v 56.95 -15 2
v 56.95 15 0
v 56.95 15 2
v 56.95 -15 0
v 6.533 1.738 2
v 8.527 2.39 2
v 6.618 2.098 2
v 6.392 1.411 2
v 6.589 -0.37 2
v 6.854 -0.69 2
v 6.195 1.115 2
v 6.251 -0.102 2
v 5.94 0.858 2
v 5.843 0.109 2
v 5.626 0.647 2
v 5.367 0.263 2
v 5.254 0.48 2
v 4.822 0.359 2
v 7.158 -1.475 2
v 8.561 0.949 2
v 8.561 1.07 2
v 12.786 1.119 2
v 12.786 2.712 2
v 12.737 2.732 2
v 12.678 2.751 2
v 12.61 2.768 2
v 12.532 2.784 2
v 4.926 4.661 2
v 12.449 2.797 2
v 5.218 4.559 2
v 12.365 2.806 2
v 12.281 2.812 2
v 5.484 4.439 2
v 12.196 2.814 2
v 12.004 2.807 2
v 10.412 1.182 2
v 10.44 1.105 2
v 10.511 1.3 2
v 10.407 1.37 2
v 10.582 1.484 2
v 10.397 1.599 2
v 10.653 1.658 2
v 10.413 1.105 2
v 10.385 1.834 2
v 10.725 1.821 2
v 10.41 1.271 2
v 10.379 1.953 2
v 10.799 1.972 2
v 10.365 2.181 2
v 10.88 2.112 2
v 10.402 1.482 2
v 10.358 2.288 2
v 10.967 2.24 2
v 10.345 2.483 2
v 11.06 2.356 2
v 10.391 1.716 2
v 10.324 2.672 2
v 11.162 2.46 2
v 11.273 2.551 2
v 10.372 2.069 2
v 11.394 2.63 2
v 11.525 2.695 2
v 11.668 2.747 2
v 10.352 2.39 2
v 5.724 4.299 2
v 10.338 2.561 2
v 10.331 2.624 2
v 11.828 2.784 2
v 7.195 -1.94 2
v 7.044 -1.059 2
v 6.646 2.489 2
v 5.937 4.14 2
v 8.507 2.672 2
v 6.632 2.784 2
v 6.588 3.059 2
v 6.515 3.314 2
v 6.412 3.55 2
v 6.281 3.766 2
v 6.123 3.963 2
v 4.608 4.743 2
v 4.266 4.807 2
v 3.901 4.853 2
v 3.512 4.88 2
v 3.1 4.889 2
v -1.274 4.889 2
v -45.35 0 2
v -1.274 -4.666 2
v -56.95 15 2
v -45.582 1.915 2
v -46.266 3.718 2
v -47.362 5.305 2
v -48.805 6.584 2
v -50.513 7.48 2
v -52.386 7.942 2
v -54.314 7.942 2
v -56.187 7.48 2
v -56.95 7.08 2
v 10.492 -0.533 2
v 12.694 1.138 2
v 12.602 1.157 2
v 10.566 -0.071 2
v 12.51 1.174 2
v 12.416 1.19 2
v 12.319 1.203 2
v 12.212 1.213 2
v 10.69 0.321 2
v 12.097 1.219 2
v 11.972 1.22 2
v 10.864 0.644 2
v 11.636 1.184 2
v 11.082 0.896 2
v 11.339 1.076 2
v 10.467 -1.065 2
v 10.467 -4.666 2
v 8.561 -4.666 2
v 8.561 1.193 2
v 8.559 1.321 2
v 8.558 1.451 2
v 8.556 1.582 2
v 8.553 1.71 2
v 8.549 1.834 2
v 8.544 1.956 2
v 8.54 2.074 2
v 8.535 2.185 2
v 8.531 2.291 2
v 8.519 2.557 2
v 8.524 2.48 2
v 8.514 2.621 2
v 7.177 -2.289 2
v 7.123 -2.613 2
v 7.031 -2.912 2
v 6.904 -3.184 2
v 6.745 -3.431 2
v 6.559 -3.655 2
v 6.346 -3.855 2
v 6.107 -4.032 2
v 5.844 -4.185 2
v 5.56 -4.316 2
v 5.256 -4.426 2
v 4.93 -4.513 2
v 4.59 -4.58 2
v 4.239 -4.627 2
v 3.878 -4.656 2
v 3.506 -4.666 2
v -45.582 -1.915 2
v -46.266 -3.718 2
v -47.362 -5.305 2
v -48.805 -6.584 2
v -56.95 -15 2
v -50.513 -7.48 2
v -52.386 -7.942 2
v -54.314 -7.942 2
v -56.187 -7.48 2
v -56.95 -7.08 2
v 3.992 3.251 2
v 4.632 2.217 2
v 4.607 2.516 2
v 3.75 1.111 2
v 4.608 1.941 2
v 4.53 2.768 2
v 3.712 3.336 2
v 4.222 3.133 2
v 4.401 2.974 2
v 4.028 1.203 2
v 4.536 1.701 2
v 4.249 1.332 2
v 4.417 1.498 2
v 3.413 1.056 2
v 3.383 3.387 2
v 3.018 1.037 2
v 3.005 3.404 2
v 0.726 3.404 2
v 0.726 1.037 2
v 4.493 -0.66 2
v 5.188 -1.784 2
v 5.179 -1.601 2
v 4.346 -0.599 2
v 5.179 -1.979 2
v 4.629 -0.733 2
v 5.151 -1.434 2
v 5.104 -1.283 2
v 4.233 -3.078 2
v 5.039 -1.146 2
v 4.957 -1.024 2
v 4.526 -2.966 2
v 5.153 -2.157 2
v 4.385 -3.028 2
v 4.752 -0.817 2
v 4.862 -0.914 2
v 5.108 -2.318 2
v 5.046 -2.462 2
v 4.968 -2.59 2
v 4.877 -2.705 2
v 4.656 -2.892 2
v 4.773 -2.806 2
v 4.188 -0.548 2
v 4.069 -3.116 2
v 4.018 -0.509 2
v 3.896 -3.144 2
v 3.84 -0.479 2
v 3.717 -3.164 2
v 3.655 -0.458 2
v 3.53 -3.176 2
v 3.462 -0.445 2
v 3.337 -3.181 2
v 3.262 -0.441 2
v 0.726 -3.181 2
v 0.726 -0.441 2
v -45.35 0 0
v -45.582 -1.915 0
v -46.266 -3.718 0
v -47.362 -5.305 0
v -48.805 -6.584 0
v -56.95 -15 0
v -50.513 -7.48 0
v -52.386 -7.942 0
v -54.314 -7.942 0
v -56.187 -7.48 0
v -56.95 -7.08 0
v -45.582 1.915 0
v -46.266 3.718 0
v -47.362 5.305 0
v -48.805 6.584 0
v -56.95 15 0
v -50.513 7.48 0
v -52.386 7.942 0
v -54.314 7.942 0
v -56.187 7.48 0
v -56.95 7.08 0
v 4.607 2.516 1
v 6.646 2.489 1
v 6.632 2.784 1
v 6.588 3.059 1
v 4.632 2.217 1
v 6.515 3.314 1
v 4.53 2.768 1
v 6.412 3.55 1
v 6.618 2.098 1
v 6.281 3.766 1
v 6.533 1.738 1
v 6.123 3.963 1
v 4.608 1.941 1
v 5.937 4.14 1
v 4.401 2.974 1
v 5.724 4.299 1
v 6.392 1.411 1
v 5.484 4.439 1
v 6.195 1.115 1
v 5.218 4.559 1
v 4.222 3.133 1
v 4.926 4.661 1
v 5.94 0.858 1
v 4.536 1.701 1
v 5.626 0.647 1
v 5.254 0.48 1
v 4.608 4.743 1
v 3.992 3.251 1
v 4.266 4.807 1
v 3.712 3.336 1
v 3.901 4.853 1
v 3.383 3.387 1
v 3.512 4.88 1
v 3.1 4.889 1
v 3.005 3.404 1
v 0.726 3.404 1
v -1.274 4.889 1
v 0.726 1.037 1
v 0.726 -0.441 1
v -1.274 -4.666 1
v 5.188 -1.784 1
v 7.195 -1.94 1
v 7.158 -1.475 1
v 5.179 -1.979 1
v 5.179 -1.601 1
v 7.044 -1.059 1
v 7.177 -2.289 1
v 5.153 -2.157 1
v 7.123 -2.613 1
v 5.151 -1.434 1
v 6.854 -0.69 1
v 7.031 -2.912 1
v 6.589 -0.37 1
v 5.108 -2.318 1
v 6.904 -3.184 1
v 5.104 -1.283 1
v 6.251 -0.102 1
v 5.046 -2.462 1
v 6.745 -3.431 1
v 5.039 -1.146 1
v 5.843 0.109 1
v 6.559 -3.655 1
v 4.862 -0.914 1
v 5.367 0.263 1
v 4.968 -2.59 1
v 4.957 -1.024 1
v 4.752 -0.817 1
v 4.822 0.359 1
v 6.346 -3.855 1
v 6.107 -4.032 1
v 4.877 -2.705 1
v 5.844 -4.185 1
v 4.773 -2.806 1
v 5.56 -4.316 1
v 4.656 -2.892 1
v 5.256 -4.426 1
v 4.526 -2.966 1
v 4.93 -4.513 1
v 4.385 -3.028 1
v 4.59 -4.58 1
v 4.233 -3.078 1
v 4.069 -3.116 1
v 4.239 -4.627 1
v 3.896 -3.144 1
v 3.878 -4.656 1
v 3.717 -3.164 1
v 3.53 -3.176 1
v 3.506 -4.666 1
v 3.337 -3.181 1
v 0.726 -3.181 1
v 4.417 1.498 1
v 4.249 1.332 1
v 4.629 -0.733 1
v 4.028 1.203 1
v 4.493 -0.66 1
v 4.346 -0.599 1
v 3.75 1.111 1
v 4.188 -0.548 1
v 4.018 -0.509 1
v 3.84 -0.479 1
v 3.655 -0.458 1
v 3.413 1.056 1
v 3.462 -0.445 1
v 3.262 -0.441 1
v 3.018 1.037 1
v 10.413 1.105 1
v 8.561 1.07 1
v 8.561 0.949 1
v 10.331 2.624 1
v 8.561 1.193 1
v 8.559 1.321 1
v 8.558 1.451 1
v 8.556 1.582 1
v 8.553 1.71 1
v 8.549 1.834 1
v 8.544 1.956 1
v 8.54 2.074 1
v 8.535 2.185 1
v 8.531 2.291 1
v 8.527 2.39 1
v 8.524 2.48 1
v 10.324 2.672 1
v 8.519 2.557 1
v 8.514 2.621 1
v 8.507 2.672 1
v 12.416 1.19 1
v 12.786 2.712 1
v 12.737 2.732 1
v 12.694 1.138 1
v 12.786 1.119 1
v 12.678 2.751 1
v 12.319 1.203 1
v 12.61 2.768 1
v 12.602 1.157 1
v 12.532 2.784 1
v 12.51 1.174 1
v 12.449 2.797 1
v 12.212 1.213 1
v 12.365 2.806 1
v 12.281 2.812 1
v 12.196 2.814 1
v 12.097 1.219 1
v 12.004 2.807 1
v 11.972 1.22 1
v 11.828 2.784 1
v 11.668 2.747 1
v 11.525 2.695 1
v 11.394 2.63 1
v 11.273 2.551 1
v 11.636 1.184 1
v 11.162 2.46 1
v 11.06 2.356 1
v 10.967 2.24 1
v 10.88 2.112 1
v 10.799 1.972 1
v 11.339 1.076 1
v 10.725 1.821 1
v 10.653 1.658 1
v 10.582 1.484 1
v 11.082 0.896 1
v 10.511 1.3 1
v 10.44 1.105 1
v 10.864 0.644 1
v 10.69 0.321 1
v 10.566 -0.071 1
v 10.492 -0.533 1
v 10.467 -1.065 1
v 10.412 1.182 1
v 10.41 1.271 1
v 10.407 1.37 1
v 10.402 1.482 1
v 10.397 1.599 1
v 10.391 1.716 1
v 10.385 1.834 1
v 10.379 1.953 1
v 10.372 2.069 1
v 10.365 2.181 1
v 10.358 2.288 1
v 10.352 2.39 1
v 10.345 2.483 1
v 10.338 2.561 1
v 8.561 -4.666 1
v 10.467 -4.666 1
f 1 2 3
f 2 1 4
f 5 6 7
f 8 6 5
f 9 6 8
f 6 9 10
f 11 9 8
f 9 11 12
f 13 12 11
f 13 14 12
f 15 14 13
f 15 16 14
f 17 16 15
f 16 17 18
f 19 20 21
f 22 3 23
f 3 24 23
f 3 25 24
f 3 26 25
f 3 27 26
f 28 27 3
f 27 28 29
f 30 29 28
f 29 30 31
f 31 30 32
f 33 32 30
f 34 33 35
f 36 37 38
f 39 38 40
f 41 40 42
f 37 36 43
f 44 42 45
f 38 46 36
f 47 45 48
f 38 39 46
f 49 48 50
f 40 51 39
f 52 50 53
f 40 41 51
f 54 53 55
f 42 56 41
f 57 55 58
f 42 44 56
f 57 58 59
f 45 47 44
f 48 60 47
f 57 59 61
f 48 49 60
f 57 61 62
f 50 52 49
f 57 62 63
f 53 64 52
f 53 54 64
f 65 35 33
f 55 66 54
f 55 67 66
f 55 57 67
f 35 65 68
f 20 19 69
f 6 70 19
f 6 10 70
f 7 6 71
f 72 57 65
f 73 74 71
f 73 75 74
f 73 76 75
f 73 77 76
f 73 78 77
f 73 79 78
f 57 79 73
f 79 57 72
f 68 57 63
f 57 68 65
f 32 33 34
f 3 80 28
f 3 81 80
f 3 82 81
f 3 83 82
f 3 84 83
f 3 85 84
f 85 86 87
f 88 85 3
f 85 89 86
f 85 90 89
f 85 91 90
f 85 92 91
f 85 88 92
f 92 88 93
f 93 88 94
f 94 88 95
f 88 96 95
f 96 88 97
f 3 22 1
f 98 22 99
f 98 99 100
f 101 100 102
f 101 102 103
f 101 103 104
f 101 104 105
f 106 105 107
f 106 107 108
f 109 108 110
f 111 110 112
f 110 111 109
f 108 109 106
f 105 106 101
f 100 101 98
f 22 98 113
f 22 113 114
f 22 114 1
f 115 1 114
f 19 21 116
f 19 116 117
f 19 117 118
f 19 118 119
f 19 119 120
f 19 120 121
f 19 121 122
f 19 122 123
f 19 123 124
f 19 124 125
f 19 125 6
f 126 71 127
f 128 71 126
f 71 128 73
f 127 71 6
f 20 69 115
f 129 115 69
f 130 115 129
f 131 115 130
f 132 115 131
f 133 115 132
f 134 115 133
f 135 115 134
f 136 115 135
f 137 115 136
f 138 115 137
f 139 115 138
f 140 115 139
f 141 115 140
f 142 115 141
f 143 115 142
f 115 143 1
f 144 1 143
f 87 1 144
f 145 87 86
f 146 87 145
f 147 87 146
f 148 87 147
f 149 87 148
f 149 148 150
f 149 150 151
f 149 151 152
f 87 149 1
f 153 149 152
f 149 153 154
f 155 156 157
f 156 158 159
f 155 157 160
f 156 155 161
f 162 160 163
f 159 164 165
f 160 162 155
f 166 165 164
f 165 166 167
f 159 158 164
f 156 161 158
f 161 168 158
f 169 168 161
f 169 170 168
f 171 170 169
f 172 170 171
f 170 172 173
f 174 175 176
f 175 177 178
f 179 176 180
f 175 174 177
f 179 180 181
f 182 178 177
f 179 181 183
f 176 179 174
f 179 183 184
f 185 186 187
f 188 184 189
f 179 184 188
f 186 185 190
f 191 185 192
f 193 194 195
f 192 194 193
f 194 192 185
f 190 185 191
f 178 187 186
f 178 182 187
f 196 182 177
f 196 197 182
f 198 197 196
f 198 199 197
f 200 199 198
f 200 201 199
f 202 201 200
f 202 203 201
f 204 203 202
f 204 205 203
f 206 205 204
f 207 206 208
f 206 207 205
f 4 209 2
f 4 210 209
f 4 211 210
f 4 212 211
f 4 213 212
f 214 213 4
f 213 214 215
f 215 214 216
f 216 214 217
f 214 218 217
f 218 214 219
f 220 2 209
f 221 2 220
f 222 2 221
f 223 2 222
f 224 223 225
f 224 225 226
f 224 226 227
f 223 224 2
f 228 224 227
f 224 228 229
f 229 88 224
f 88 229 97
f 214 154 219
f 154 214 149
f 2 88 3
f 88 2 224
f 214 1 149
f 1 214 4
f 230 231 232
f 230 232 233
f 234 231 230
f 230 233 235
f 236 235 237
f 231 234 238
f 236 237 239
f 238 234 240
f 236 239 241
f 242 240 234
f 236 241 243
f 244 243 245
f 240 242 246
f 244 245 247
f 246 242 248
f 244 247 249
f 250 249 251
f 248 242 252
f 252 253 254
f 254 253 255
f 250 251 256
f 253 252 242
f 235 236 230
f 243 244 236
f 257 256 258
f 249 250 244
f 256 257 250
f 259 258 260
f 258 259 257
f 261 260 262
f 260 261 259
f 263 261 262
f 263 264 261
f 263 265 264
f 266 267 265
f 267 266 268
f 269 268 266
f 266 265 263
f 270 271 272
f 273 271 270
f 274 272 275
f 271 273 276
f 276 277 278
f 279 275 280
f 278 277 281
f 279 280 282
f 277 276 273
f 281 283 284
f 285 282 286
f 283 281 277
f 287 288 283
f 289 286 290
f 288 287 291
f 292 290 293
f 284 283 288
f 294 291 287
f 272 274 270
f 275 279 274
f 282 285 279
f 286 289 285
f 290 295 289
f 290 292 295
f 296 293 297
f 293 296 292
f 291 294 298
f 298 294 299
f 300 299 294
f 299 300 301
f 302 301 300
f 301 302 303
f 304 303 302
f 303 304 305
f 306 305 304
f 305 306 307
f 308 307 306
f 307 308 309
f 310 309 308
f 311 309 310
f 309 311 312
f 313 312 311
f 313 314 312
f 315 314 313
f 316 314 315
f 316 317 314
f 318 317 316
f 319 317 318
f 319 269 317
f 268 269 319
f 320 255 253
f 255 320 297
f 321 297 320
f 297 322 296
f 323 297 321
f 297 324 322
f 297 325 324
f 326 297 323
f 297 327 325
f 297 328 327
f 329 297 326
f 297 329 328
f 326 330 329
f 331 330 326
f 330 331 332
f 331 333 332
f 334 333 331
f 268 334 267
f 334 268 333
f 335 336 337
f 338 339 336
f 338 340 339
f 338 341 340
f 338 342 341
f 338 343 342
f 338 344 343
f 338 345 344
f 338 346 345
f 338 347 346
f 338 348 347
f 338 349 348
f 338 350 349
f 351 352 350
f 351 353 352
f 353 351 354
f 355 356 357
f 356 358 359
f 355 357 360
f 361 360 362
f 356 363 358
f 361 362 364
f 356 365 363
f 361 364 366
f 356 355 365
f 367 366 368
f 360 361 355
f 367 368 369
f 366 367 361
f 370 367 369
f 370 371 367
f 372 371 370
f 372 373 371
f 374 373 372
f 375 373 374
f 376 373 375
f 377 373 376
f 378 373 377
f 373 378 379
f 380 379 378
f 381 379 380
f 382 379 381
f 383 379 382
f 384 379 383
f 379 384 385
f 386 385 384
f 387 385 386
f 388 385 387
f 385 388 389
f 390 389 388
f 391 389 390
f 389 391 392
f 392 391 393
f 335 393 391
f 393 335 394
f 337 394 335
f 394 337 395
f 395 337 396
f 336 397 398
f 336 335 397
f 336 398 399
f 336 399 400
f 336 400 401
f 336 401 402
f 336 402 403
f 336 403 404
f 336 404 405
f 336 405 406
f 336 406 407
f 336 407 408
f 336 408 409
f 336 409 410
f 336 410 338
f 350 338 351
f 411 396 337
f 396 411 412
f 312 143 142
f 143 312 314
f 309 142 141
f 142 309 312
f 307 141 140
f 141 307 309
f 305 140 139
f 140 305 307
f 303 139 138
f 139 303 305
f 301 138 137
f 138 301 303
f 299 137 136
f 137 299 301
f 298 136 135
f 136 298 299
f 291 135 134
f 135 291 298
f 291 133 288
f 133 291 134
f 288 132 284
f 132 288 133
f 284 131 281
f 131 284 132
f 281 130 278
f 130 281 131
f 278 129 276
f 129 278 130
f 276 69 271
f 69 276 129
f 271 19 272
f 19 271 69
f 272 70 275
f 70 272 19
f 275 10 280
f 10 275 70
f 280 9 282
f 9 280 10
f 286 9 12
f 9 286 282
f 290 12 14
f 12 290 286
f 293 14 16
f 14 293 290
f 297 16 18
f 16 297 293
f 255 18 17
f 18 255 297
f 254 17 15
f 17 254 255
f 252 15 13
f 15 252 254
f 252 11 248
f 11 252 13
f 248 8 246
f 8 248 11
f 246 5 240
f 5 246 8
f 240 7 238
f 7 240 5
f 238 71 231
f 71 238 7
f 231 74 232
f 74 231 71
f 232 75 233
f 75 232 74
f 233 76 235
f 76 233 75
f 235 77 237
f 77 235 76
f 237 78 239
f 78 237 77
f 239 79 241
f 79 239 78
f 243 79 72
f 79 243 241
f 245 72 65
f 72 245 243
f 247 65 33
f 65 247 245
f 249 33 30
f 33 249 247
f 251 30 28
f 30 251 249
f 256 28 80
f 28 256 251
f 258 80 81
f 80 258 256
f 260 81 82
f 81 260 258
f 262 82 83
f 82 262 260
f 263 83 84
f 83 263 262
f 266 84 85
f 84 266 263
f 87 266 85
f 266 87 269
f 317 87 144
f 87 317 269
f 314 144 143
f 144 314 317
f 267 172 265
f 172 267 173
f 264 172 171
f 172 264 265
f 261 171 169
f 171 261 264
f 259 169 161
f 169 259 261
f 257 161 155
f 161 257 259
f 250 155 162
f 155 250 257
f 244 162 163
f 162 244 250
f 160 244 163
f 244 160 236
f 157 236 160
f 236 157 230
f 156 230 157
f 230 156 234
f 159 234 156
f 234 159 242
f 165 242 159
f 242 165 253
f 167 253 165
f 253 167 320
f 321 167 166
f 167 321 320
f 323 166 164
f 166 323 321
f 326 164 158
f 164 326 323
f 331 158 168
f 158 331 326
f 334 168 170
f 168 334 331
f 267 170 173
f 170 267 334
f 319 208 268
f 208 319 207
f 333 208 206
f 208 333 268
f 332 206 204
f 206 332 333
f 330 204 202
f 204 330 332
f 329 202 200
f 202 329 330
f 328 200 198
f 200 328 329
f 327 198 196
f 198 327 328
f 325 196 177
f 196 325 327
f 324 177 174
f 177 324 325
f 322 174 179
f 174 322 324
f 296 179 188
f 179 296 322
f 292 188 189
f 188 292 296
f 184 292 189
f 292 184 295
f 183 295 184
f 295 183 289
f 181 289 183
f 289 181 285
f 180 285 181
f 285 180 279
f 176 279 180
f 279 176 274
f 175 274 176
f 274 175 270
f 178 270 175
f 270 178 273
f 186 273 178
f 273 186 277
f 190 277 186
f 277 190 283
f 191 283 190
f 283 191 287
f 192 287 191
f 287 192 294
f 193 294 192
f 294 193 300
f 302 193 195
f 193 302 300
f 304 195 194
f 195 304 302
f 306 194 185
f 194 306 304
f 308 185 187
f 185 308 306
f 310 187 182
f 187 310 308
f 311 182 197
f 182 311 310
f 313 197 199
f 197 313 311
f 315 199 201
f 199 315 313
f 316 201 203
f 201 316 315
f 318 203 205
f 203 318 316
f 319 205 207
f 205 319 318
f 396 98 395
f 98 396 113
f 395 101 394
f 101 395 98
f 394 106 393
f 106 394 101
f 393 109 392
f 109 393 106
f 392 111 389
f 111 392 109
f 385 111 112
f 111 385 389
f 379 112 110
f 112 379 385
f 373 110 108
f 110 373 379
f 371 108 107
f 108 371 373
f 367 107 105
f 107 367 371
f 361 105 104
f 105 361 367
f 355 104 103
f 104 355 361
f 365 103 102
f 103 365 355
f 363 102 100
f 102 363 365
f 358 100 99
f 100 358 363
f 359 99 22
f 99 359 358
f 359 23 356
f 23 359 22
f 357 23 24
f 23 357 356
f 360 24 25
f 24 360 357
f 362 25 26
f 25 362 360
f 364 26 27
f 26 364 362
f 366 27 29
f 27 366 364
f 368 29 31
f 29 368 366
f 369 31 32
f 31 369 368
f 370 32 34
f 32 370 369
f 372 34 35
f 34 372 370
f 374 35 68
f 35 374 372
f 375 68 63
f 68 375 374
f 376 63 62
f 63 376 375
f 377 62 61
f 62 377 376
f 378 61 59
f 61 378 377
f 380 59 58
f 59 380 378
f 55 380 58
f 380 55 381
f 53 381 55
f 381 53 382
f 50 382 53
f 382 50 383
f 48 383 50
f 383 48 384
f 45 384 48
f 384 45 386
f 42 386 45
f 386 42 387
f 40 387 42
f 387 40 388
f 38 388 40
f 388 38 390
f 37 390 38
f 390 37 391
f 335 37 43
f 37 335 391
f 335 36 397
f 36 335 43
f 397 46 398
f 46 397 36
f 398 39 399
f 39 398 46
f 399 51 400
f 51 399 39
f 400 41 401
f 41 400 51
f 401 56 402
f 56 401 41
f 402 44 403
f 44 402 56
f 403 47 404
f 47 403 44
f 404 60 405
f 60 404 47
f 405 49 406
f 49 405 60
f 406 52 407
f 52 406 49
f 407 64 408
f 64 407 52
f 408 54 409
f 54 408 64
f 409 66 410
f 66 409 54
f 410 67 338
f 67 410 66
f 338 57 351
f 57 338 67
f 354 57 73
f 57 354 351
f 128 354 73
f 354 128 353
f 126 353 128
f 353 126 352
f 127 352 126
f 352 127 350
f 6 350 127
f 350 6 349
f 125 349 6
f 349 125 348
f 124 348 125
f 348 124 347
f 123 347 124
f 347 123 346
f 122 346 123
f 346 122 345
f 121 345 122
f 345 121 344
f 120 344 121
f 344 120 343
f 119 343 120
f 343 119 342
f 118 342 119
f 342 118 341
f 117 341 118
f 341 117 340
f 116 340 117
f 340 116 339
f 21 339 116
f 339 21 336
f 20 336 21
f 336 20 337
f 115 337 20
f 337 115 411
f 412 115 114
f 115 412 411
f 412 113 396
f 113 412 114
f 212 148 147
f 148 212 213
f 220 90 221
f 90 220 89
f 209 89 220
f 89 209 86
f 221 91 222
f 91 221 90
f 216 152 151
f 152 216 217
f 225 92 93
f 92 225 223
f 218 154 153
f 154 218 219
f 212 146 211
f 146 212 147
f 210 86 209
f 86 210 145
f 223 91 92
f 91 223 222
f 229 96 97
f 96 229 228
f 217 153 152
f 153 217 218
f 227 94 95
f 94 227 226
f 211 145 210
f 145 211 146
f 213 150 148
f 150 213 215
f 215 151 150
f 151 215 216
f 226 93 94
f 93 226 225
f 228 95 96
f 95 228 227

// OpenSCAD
// Element parameters
valence = 1;
positive = false;
element = "Br";
width = 114.7;

// Main parameters
thinkness = 2;
text_size = 10;
text_thinkness = 1.4;
cylinder_radius = 8;
multipler = 30;
connection_tolerance = 0.4;

// Main program
if (positive){
    TextBlock(element,positive);
    Connection(valence,positive);
    }
else{
    difference(){
    TextBlock(element,positive);
    Connection(valence,positive);
}
}

// Modules definition.

module Connection(number,sign){
    if (sign){
      difference() {
      translate([width/2+cylinder_radius/2,-multipler*(valence-1)/2,thinkness/2]) lineup(number,multipler) cylinder(thinkness,cylinder_radius-connection_tolerance,cylinder_radius-connection_tolerance, true);
    translate([0,0,thinkness/2]) cube([width,valence*multipler-(connection_tolerance*2),thinkness], center=true);
      }
          }
    else{
        translate([-width/2+cylinder_radius/2,-multipler*(valence-1)/2,thinkness/2]) lineup(number,multipler) cylinder(thinkness,cylinder_radius,cylinder_radius, true);
        
    }
}
module lineup(num, space) {
   for (i = [0 : valence-1])
     translate([ 0, space*i, 0 ]) children(0);
}
module TextBlock(letter,sign) {
    if (sign){
    difference() {
        translate([0,0,thinkness/2]) cube([width,valence*multipler-(connection_tolerance*2),thinkness], center=true);
        translate([0,0,thinkness-text_thinkness]) {
            // convexity is needed for correct preview
            // since characters can be highly concave
            linear_extrude(text_thinkness, convexity=4)
                text(letter, 
                     size=text_size,
                     font="Liberation Sans:style=Bold",
                     halign="center",
                     valign="center");
        }
    }
    }
   else{    
           difference() {
       translate([0,0,thinkness/2]) cube([width-2*connection_tolerance,valence*multipler,thinkness], center=true);
        translate([cylinder_radius*4/6,0,thinkness/2]) {
            // convexity is needed for correct preview
            // since characters can be highly concave
            linear_extrude(text_thinkness, convexity=4)
                text(letter, 
                     size=text_size,
                     font="Liberation Sans:style=Bold",
                     halign="center",
                     valign="center");
        }
    }
}
}

echo(version=version());
// Written by Jabi Luengo <jluengoe@herrikide.eus>
//
// To the extent possible under law, the author(s) have dedicated all
// copyright and related and neighboring rights to this software to the
// public domain worldwide. This software is distributed without any
// warranty.
//
// You should have received a copy of the CC0 Public Domain
// Dedication along with this software.
// If not, see <http://creativecommons.org/publicdomain/zero/1.0/>.
